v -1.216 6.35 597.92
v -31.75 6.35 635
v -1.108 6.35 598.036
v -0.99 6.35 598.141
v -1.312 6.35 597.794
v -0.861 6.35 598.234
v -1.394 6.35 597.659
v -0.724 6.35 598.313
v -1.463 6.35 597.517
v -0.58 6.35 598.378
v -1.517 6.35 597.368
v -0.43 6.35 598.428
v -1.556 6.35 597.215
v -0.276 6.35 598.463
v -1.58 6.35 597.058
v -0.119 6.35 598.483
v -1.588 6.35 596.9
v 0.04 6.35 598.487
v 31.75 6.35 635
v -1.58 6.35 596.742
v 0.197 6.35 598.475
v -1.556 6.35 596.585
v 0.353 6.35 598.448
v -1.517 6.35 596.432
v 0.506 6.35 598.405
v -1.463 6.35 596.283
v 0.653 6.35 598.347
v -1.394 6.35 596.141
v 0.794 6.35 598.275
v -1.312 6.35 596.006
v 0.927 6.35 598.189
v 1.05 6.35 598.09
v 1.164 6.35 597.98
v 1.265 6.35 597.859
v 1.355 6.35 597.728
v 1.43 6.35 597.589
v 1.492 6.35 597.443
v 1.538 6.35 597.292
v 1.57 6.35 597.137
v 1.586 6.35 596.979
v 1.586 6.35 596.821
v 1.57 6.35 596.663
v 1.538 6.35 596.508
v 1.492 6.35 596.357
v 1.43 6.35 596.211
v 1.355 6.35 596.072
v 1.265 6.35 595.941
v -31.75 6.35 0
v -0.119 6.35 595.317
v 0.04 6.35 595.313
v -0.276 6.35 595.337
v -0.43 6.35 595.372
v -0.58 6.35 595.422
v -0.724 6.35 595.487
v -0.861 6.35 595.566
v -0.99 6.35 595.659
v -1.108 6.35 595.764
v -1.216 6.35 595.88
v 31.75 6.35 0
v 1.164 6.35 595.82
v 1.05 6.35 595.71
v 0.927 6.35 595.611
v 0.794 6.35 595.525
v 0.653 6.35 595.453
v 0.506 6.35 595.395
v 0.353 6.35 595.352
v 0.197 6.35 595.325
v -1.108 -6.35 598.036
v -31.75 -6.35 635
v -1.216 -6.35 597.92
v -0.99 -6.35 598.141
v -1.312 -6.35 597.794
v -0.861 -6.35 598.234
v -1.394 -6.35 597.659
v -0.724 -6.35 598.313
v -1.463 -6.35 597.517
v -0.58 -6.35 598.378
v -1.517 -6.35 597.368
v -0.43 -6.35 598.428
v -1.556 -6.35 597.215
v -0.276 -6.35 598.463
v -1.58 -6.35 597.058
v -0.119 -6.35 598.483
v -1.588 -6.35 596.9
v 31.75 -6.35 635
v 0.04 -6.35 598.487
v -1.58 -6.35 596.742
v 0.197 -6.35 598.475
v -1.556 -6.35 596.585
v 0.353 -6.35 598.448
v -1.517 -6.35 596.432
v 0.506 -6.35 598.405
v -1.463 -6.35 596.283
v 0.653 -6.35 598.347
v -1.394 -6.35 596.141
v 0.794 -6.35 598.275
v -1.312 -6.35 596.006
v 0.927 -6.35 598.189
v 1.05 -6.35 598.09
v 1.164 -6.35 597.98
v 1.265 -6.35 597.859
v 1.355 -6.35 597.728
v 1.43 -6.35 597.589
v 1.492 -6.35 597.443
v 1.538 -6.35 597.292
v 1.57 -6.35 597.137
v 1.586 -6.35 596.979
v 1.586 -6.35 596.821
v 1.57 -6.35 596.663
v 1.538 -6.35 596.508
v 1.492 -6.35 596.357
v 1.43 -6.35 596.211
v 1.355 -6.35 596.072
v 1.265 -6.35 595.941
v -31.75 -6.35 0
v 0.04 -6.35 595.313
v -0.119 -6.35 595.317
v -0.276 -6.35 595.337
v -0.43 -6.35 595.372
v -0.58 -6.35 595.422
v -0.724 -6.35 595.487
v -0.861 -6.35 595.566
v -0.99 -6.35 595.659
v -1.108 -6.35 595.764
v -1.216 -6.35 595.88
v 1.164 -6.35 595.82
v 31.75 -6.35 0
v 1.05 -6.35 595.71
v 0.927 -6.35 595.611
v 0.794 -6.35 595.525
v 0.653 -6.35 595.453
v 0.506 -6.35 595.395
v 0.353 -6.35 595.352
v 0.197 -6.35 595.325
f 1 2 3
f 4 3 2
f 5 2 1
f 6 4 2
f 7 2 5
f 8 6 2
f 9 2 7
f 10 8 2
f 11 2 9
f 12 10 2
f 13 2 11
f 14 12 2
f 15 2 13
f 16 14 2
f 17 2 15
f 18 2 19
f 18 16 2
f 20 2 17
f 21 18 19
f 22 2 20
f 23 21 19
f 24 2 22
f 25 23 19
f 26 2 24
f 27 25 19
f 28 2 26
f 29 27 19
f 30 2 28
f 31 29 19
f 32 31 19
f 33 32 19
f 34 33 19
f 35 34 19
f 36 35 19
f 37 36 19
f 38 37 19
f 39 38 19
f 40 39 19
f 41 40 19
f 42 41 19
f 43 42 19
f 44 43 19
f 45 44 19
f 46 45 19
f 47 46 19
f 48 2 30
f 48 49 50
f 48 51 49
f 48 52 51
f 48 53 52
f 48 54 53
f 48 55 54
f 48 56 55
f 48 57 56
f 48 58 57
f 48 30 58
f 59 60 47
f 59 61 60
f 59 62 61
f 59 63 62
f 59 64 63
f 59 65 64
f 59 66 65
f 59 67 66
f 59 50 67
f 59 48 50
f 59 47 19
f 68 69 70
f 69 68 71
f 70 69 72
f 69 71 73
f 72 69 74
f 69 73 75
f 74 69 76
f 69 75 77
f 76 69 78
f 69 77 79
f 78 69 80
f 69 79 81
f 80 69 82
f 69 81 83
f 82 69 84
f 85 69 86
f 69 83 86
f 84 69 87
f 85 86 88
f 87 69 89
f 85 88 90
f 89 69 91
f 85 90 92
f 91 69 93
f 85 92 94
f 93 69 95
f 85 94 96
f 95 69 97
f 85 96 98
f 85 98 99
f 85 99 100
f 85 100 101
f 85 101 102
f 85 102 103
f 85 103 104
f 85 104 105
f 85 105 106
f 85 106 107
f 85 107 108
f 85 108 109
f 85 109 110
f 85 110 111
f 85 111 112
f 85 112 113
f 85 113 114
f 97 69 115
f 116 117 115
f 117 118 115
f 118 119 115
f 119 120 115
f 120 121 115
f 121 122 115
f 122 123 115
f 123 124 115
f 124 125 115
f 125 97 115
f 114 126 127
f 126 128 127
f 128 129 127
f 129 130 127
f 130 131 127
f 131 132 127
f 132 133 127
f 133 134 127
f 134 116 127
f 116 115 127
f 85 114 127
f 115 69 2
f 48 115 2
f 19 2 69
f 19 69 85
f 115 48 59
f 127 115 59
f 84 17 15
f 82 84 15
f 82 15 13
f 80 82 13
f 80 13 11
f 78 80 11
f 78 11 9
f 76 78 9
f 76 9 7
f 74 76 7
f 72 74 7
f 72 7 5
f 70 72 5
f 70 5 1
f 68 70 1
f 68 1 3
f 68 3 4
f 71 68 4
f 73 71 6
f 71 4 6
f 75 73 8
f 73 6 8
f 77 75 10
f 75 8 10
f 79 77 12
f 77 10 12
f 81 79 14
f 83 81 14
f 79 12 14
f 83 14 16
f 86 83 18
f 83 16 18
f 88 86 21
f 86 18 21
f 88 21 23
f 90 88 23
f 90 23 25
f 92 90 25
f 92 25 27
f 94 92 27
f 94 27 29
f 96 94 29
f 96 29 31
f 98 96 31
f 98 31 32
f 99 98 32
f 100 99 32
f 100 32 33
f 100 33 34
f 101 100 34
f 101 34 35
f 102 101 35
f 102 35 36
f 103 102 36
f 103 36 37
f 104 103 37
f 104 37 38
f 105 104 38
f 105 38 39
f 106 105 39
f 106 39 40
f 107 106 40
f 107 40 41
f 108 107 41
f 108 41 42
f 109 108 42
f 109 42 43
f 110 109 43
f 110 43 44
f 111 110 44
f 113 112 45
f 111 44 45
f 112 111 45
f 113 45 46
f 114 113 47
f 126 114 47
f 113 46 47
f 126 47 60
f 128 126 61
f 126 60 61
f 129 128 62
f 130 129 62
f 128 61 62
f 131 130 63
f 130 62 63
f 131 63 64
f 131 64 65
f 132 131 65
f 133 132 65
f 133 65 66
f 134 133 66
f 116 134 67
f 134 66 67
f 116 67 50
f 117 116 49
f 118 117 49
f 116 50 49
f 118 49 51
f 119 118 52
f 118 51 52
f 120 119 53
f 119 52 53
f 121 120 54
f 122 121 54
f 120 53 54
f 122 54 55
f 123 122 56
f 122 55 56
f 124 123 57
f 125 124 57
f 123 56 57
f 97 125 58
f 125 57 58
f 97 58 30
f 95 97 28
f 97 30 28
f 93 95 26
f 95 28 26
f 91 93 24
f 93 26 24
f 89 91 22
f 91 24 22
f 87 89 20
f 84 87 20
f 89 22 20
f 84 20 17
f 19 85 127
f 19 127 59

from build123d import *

# Parameters (mm, degrees)
F0_W     = 63.5
F0_H     = 12.7
F1_DEPTH = 635
F2_R     = 1.5875
F3_DEPTH = 12.701


with BuildPart() as f1:
    # F0 (on Top) → F1 (new body)
    with BuildSketch(Plane.XY):
        Rectangle(F0_W, F0_H)
    extrude(amount=F1_DEPTH)

    # F2 (on face) → F3 (cut, through all)
    with BuildSketch(Plane(origin=(0, 6.35, 0), x_dir=(-1, 0, 0), z_dir=(0, 1, 0))):
        with Locations((0, 596.9)):
            Circle(F2_R)
    extrude(amount=-F3_DEPTH, mode=Mode.SUBTRACT)


solid = f1.part
